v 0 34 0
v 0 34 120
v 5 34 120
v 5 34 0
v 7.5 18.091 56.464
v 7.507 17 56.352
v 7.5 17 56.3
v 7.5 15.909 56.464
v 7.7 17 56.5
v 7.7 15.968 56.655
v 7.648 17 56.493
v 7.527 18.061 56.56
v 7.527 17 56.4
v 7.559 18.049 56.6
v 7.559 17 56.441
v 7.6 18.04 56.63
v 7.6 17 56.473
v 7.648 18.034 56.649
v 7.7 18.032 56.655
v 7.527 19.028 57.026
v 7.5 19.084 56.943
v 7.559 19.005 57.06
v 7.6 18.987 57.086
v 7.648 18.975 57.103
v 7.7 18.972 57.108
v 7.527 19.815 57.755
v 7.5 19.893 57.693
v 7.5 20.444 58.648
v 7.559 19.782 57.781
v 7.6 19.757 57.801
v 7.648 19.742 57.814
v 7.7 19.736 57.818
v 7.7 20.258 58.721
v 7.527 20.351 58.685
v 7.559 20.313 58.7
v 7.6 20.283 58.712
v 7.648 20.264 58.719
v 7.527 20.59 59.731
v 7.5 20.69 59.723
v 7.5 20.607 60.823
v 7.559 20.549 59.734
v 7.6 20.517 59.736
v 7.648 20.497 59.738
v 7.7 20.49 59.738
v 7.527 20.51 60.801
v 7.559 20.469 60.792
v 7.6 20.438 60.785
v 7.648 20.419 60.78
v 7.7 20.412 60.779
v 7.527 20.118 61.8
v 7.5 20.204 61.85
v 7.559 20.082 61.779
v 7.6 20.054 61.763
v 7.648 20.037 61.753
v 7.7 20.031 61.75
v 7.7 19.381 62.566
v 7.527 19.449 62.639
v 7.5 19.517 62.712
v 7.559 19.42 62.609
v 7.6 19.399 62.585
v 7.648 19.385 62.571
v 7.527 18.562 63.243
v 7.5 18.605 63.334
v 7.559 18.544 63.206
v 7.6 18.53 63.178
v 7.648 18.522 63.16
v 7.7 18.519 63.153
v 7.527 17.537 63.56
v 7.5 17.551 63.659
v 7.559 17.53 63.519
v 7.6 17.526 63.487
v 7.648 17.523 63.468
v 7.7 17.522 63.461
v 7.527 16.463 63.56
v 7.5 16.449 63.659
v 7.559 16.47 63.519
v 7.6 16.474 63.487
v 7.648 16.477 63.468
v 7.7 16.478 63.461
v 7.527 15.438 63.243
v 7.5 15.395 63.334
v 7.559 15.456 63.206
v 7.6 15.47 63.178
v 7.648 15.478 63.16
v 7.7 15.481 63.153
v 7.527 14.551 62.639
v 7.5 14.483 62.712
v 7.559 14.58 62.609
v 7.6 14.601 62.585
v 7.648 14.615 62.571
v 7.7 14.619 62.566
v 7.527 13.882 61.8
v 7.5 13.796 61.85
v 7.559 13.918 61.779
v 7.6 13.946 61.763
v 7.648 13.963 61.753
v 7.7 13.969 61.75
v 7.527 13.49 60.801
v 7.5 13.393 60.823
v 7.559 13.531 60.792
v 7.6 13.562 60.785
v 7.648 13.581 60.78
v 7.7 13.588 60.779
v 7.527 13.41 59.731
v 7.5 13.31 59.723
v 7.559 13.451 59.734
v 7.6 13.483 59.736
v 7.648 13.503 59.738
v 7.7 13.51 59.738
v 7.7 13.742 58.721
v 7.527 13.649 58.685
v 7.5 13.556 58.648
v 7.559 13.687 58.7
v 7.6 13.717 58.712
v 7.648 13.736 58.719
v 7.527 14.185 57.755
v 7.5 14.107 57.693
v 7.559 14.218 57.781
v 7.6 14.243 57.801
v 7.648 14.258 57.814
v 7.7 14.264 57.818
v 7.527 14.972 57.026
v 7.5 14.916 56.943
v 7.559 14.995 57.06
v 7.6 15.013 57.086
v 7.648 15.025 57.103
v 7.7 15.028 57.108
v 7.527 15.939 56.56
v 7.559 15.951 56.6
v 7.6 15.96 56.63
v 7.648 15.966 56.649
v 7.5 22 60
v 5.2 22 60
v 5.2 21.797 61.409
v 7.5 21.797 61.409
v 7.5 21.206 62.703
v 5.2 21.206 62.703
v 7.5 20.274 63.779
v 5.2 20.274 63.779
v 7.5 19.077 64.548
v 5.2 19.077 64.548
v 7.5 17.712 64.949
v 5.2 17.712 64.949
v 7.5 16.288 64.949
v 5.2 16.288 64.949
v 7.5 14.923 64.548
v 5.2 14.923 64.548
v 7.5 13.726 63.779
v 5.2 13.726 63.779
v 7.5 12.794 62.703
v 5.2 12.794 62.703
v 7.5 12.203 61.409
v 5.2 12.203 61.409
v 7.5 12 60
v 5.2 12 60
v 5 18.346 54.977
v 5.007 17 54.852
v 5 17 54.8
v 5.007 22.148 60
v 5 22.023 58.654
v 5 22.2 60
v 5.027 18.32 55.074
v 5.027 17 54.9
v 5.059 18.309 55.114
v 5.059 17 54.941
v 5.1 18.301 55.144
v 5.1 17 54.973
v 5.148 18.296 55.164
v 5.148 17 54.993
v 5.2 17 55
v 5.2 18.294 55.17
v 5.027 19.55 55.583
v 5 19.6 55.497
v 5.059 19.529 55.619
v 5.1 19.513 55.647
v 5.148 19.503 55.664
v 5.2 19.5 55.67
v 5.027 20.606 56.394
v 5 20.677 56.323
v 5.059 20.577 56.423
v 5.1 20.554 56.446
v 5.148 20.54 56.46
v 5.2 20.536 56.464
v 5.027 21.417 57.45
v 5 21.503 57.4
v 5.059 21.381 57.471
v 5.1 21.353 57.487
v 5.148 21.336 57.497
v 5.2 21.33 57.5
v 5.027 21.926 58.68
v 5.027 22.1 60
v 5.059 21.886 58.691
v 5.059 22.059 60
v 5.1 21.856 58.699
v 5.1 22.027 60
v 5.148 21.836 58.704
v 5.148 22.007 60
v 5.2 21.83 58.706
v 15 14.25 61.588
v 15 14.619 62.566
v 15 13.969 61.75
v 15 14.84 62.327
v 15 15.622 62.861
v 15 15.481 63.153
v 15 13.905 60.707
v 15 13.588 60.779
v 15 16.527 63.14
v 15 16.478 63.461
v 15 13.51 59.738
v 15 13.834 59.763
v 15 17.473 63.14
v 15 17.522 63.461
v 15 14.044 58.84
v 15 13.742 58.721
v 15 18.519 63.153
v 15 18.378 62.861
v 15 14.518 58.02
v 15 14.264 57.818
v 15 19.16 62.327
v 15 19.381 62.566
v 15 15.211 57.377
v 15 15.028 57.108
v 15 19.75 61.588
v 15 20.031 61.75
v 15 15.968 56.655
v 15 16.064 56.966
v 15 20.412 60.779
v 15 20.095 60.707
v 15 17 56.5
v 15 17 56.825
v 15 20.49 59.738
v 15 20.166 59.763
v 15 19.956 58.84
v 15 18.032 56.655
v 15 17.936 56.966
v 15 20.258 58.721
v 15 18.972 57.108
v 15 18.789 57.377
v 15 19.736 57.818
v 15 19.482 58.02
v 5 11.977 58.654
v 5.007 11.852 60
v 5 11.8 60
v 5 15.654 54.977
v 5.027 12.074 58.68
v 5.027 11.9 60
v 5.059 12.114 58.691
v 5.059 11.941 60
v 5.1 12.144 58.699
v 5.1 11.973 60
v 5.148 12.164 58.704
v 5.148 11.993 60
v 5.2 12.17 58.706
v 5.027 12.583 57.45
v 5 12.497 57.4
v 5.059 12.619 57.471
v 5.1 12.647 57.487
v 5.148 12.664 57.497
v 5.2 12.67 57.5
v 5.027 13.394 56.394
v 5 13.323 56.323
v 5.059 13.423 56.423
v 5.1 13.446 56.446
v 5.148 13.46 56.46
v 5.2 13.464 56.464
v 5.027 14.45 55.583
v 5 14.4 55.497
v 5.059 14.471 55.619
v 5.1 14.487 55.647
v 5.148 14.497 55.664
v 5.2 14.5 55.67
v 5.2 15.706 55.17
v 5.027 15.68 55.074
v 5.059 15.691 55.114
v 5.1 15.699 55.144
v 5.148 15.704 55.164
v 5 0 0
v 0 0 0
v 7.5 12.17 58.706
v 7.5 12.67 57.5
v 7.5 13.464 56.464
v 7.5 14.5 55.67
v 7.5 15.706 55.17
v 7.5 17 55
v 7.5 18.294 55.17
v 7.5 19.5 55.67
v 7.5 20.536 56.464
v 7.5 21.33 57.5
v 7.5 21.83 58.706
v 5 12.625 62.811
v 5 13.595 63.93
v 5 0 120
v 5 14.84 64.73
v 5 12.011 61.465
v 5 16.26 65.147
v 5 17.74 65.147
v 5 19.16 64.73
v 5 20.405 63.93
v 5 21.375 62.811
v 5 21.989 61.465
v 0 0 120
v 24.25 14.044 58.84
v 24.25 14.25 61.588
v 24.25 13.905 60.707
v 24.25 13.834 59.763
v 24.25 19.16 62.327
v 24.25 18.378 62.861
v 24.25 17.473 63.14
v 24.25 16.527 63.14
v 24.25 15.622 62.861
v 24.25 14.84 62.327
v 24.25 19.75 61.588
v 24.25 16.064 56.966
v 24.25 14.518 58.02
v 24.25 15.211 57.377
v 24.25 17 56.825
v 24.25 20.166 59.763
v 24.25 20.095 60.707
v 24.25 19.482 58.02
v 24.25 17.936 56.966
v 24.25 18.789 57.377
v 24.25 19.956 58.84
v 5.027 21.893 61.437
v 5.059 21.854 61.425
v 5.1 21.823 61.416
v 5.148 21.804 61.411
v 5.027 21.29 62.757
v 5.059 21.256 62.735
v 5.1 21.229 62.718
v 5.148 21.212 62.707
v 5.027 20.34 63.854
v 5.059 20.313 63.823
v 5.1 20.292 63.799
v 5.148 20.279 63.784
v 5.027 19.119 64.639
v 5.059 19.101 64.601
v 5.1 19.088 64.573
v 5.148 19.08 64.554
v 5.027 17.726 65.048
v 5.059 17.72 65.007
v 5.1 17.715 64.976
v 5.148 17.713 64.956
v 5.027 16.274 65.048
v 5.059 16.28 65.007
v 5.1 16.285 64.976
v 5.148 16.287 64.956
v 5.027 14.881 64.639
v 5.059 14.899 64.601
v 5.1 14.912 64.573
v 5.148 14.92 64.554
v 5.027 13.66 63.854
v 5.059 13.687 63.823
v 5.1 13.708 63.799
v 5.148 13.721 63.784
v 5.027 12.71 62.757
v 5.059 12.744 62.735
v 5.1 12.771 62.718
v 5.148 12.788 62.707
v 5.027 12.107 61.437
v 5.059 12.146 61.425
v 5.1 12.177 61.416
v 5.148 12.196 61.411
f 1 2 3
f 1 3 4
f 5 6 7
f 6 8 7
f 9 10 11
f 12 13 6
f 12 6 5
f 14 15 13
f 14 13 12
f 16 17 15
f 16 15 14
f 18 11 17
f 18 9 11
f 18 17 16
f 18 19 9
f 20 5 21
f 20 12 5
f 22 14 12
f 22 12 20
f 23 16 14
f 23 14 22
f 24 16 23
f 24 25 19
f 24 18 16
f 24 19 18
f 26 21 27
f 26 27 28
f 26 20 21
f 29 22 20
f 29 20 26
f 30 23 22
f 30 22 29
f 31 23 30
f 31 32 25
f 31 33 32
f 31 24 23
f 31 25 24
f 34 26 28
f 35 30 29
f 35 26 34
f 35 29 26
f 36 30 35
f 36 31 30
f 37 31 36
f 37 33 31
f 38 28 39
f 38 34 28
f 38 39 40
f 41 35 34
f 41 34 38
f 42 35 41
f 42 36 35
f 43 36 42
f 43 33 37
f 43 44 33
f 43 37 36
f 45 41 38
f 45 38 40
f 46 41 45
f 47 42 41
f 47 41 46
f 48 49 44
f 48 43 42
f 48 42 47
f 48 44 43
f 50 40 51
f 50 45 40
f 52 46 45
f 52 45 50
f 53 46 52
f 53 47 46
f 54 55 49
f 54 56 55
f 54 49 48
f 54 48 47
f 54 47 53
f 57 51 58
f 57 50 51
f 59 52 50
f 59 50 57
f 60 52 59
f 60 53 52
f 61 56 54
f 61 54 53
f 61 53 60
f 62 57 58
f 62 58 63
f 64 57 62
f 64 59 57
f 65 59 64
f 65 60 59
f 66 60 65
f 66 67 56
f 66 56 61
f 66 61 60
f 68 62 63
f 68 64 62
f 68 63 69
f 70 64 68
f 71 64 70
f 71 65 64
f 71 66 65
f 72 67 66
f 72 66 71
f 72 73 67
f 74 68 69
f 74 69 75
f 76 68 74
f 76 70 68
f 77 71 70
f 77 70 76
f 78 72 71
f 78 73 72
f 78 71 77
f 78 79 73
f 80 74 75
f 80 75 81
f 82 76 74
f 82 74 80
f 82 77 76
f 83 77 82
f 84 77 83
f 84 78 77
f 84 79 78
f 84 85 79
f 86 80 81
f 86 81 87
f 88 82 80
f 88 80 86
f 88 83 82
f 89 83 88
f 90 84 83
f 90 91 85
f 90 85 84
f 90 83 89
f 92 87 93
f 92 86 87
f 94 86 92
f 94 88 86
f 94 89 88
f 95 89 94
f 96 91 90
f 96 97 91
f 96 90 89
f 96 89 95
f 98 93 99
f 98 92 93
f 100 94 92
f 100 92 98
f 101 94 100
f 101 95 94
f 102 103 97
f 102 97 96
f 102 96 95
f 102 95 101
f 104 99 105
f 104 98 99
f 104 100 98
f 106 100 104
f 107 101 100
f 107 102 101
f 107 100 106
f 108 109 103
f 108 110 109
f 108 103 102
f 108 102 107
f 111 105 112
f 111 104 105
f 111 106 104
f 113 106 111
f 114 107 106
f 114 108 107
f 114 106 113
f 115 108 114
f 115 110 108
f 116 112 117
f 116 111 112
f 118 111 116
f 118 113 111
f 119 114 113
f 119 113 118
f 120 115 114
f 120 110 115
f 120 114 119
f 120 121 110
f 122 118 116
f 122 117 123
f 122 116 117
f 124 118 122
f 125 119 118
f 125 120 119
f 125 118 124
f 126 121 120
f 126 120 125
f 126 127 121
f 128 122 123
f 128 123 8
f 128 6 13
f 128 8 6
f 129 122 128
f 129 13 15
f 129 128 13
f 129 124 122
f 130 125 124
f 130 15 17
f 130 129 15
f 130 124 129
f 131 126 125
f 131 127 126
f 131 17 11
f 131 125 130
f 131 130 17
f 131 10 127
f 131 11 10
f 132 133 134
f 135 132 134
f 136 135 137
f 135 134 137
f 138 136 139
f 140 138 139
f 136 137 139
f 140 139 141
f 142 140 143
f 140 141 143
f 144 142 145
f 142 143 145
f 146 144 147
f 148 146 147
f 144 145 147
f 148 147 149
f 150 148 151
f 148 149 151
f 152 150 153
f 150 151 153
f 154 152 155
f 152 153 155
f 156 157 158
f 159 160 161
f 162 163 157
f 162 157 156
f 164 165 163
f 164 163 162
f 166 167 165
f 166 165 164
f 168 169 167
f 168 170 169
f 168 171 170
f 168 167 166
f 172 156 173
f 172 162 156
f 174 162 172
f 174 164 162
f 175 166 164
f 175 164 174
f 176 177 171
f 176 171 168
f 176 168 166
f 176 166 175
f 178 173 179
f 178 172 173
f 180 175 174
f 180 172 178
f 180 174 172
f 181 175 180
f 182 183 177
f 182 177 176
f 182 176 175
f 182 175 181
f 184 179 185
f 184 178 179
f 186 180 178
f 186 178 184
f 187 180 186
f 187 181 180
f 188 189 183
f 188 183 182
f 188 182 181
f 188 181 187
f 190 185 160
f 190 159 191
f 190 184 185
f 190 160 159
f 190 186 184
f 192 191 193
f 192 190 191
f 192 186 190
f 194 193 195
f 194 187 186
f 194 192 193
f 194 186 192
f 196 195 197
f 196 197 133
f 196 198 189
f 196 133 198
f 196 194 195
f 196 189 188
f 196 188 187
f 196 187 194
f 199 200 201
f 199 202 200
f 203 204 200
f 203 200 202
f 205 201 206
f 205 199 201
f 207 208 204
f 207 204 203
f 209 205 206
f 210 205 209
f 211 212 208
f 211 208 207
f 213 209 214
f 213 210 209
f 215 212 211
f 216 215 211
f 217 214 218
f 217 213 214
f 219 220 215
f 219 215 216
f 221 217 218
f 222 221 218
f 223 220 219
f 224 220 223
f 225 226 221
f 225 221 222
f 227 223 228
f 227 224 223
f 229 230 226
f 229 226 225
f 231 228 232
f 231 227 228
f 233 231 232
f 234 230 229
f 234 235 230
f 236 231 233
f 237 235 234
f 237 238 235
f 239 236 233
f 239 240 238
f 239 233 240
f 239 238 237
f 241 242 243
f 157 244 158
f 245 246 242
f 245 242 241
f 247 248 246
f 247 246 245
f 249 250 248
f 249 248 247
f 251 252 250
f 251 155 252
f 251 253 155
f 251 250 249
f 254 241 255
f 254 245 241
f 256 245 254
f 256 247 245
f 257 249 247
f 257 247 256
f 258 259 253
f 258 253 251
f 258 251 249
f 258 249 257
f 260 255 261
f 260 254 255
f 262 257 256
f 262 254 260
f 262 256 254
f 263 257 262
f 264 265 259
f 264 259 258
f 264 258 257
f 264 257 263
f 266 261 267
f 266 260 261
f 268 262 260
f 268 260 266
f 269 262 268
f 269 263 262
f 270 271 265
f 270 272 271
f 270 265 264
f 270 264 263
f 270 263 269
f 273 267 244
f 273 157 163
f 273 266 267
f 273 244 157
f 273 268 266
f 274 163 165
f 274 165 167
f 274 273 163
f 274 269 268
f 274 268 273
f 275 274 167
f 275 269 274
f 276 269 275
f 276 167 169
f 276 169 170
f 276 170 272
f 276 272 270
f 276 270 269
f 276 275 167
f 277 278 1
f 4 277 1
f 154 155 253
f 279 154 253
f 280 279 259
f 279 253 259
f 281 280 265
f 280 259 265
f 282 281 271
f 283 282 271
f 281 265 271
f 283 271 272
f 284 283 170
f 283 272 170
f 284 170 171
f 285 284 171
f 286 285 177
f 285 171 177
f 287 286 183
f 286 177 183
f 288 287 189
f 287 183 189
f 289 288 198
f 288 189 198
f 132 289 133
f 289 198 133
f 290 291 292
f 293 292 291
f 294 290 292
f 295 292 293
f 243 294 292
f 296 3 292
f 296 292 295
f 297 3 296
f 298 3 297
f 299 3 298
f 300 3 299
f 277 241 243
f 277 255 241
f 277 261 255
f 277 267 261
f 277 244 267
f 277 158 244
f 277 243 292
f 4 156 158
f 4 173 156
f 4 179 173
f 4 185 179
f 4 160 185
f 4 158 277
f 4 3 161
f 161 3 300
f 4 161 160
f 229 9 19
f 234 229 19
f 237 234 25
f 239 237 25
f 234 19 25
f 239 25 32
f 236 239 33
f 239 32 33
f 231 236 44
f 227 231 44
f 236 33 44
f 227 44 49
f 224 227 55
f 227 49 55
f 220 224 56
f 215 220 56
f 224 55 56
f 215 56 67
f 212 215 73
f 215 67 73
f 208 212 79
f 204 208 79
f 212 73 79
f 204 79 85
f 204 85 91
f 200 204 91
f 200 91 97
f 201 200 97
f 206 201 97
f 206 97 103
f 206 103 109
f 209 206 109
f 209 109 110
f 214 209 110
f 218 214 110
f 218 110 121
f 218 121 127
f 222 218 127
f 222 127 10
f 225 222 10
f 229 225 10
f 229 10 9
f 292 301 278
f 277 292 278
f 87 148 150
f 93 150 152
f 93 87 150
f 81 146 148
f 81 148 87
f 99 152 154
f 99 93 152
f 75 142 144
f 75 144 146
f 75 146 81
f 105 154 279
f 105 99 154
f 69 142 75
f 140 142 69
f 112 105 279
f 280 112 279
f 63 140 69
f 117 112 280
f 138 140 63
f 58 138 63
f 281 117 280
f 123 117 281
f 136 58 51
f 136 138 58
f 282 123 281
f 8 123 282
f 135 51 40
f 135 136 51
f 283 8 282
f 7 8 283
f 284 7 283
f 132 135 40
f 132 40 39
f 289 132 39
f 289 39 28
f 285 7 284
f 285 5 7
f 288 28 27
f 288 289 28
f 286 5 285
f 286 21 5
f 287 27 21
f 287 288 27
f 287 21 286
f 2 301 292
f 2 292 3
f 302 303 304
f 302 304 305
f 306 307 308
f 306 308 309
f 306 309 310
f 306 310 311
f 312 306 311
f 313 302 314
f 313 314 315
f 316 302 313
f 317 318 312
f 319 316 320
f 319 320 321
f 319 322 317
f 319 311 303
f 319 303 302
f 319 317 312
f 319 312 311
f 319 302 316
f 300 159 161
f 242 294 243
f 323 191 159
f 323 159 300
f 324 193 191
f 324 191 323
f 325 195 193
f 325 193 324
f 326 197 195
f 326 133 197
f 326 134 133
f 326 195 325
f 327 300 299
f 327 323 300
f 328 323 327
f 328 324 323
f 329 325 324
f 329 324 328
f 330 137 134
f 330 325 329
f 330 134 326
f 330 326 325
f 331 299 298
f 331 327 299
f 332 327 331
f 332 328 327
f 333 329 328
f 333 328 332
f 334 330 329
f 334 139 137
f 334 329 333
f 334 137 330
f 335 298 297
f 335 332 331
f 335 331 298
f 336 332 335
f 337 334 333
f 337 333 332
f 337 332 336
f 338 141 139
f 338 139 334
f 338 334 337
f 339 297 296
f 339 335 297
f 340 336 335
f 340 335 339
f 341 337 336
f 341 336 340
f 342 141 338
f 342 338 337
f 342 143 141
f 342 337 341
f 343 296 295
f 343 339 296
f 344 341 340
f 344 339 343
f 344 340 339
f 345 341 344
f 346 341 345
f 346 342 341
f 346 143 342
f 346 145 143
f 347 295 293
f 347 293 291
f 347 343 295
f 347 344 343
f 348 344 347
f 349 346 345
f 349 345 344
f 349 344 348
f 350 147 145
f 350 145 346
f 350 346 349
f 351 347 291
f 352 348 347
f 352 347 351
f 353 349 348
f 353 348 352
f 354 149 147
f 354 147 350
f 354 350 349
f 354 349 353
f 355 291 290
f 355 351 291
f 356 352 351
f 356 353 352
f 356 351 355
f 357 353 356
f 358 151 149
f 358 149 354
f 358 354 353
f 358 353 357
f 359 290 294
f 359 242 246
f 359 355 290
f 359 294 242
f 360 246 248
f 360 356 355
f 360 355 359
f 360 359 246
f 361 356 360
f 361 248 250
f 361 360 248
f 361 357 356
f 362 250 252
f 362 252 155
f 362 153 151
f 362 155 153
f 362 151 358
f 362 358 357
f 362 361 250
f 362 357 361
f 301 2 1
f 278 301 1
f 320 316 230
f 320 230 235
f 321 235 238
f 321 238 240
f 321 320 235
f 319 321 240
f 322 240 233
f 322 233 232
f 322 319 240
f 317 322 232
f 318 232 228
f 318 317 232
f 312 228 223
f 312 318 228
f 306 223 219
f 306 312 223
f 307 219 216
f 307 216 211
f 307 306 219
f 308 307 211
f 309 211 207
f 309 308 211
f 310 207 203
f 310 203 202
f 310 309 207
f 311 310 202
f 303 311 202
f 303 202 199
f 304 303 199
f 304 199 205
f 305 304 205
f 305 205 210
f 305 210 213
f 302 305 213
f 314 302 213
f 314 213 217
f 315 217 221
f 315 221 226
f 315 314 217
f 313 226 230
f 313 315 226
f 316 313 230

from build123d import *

# Parameters (mm, degrees)
SKETCH1_W           = 120
SKETCH1_H           = 34
BOSS_EXTRUDE1_DEPTH = 5
BOSS_EXTRUDE2_DEPTH = 2.5
SKETCH3_R           = 3.5
BOSS_EXTRUDE3_DEPTH = 16.75
SKETCH4_R           = 3.5
SKETCH4_R_2         = 3.175
CUT_EXTRUDE1_DEPTH  = 9.25
FILLET1_R           = 0.2


with BuildPart() as part:
    # Sketch1 → Boss-Extrude1 (new body)
    with BuildSketch(Plane(origin=(0, 0, 0), x_dir=(0, 0, -1), z_dir=(1, 0, 0))):
        with Locations((-60, 17)):
            Rectangle(SKETCH1_W, SKETCH1_H)
    extrude(amount=BOSS_EXTRUDE1_DEPTH)

    # Sketch2 → Boss-Extrude2 (add)
    with BuildSketch(Plane(origin=(5, 0, 0), x_dir=(0, 0, -1), z_dir=(1, 0, 0))):
        with BuildLine():
            ThreePointArc((-55, 17), (-56.464466094, 20.535533906), (-60, 22))
            Line((-60, 22), (-60, 12))
            ThreePointArc((-60, 12), (-56.464466094, 13.464466094), (-55, 17))
        make_face()
        with BuildLine():
            Line((-60, 12), (-60, 22))
            ThreePointArc((-60, 22), (-65, 17), (-60, 12))
        make_face()
    extrude(amount=BOSS_EXTRUDE2_DEPTH)

    # Sketch3 → Boss-Extrude3 (add)
    with BuildSketch(Plane(origin=(7.5, 0, 0), x_dir=(0, 0, -1), z_dir=(1, 0, 0))):
        with Locations((-60, 17)):
            Circle(SKETCH3_R)
    extrude(amount=BOSS_EXTRUDE3_DEPTH)

    # Sketch4 → Cut-Extrude1 (cut)
    with BuildSketch(Plane(origin=(24.25, 0, 0), x_dir=(0, 0, -1), z_dir=(1, 0, 0))):
        with Locations((-60, 17)):
            Circle(SKETCH4_R)
        with Locations((-60, 17)):
            Circle(SKETCH4_R_2, mode=Mode.SUBTRACT)
    extrude(amount=-CUT_EXTRUDE1_DEPTH, mode=Mode.SUBTRACT)

    # Fillet1
    fillet1_edges = [part.edges().sort_by_distance(p)[0] for p in [
        (5, 12, 60),
        (7.5, 17, 63.5),
    ]]
    fillet(fillet1_edges, radius=FILLET1_R)


solid = part.part
